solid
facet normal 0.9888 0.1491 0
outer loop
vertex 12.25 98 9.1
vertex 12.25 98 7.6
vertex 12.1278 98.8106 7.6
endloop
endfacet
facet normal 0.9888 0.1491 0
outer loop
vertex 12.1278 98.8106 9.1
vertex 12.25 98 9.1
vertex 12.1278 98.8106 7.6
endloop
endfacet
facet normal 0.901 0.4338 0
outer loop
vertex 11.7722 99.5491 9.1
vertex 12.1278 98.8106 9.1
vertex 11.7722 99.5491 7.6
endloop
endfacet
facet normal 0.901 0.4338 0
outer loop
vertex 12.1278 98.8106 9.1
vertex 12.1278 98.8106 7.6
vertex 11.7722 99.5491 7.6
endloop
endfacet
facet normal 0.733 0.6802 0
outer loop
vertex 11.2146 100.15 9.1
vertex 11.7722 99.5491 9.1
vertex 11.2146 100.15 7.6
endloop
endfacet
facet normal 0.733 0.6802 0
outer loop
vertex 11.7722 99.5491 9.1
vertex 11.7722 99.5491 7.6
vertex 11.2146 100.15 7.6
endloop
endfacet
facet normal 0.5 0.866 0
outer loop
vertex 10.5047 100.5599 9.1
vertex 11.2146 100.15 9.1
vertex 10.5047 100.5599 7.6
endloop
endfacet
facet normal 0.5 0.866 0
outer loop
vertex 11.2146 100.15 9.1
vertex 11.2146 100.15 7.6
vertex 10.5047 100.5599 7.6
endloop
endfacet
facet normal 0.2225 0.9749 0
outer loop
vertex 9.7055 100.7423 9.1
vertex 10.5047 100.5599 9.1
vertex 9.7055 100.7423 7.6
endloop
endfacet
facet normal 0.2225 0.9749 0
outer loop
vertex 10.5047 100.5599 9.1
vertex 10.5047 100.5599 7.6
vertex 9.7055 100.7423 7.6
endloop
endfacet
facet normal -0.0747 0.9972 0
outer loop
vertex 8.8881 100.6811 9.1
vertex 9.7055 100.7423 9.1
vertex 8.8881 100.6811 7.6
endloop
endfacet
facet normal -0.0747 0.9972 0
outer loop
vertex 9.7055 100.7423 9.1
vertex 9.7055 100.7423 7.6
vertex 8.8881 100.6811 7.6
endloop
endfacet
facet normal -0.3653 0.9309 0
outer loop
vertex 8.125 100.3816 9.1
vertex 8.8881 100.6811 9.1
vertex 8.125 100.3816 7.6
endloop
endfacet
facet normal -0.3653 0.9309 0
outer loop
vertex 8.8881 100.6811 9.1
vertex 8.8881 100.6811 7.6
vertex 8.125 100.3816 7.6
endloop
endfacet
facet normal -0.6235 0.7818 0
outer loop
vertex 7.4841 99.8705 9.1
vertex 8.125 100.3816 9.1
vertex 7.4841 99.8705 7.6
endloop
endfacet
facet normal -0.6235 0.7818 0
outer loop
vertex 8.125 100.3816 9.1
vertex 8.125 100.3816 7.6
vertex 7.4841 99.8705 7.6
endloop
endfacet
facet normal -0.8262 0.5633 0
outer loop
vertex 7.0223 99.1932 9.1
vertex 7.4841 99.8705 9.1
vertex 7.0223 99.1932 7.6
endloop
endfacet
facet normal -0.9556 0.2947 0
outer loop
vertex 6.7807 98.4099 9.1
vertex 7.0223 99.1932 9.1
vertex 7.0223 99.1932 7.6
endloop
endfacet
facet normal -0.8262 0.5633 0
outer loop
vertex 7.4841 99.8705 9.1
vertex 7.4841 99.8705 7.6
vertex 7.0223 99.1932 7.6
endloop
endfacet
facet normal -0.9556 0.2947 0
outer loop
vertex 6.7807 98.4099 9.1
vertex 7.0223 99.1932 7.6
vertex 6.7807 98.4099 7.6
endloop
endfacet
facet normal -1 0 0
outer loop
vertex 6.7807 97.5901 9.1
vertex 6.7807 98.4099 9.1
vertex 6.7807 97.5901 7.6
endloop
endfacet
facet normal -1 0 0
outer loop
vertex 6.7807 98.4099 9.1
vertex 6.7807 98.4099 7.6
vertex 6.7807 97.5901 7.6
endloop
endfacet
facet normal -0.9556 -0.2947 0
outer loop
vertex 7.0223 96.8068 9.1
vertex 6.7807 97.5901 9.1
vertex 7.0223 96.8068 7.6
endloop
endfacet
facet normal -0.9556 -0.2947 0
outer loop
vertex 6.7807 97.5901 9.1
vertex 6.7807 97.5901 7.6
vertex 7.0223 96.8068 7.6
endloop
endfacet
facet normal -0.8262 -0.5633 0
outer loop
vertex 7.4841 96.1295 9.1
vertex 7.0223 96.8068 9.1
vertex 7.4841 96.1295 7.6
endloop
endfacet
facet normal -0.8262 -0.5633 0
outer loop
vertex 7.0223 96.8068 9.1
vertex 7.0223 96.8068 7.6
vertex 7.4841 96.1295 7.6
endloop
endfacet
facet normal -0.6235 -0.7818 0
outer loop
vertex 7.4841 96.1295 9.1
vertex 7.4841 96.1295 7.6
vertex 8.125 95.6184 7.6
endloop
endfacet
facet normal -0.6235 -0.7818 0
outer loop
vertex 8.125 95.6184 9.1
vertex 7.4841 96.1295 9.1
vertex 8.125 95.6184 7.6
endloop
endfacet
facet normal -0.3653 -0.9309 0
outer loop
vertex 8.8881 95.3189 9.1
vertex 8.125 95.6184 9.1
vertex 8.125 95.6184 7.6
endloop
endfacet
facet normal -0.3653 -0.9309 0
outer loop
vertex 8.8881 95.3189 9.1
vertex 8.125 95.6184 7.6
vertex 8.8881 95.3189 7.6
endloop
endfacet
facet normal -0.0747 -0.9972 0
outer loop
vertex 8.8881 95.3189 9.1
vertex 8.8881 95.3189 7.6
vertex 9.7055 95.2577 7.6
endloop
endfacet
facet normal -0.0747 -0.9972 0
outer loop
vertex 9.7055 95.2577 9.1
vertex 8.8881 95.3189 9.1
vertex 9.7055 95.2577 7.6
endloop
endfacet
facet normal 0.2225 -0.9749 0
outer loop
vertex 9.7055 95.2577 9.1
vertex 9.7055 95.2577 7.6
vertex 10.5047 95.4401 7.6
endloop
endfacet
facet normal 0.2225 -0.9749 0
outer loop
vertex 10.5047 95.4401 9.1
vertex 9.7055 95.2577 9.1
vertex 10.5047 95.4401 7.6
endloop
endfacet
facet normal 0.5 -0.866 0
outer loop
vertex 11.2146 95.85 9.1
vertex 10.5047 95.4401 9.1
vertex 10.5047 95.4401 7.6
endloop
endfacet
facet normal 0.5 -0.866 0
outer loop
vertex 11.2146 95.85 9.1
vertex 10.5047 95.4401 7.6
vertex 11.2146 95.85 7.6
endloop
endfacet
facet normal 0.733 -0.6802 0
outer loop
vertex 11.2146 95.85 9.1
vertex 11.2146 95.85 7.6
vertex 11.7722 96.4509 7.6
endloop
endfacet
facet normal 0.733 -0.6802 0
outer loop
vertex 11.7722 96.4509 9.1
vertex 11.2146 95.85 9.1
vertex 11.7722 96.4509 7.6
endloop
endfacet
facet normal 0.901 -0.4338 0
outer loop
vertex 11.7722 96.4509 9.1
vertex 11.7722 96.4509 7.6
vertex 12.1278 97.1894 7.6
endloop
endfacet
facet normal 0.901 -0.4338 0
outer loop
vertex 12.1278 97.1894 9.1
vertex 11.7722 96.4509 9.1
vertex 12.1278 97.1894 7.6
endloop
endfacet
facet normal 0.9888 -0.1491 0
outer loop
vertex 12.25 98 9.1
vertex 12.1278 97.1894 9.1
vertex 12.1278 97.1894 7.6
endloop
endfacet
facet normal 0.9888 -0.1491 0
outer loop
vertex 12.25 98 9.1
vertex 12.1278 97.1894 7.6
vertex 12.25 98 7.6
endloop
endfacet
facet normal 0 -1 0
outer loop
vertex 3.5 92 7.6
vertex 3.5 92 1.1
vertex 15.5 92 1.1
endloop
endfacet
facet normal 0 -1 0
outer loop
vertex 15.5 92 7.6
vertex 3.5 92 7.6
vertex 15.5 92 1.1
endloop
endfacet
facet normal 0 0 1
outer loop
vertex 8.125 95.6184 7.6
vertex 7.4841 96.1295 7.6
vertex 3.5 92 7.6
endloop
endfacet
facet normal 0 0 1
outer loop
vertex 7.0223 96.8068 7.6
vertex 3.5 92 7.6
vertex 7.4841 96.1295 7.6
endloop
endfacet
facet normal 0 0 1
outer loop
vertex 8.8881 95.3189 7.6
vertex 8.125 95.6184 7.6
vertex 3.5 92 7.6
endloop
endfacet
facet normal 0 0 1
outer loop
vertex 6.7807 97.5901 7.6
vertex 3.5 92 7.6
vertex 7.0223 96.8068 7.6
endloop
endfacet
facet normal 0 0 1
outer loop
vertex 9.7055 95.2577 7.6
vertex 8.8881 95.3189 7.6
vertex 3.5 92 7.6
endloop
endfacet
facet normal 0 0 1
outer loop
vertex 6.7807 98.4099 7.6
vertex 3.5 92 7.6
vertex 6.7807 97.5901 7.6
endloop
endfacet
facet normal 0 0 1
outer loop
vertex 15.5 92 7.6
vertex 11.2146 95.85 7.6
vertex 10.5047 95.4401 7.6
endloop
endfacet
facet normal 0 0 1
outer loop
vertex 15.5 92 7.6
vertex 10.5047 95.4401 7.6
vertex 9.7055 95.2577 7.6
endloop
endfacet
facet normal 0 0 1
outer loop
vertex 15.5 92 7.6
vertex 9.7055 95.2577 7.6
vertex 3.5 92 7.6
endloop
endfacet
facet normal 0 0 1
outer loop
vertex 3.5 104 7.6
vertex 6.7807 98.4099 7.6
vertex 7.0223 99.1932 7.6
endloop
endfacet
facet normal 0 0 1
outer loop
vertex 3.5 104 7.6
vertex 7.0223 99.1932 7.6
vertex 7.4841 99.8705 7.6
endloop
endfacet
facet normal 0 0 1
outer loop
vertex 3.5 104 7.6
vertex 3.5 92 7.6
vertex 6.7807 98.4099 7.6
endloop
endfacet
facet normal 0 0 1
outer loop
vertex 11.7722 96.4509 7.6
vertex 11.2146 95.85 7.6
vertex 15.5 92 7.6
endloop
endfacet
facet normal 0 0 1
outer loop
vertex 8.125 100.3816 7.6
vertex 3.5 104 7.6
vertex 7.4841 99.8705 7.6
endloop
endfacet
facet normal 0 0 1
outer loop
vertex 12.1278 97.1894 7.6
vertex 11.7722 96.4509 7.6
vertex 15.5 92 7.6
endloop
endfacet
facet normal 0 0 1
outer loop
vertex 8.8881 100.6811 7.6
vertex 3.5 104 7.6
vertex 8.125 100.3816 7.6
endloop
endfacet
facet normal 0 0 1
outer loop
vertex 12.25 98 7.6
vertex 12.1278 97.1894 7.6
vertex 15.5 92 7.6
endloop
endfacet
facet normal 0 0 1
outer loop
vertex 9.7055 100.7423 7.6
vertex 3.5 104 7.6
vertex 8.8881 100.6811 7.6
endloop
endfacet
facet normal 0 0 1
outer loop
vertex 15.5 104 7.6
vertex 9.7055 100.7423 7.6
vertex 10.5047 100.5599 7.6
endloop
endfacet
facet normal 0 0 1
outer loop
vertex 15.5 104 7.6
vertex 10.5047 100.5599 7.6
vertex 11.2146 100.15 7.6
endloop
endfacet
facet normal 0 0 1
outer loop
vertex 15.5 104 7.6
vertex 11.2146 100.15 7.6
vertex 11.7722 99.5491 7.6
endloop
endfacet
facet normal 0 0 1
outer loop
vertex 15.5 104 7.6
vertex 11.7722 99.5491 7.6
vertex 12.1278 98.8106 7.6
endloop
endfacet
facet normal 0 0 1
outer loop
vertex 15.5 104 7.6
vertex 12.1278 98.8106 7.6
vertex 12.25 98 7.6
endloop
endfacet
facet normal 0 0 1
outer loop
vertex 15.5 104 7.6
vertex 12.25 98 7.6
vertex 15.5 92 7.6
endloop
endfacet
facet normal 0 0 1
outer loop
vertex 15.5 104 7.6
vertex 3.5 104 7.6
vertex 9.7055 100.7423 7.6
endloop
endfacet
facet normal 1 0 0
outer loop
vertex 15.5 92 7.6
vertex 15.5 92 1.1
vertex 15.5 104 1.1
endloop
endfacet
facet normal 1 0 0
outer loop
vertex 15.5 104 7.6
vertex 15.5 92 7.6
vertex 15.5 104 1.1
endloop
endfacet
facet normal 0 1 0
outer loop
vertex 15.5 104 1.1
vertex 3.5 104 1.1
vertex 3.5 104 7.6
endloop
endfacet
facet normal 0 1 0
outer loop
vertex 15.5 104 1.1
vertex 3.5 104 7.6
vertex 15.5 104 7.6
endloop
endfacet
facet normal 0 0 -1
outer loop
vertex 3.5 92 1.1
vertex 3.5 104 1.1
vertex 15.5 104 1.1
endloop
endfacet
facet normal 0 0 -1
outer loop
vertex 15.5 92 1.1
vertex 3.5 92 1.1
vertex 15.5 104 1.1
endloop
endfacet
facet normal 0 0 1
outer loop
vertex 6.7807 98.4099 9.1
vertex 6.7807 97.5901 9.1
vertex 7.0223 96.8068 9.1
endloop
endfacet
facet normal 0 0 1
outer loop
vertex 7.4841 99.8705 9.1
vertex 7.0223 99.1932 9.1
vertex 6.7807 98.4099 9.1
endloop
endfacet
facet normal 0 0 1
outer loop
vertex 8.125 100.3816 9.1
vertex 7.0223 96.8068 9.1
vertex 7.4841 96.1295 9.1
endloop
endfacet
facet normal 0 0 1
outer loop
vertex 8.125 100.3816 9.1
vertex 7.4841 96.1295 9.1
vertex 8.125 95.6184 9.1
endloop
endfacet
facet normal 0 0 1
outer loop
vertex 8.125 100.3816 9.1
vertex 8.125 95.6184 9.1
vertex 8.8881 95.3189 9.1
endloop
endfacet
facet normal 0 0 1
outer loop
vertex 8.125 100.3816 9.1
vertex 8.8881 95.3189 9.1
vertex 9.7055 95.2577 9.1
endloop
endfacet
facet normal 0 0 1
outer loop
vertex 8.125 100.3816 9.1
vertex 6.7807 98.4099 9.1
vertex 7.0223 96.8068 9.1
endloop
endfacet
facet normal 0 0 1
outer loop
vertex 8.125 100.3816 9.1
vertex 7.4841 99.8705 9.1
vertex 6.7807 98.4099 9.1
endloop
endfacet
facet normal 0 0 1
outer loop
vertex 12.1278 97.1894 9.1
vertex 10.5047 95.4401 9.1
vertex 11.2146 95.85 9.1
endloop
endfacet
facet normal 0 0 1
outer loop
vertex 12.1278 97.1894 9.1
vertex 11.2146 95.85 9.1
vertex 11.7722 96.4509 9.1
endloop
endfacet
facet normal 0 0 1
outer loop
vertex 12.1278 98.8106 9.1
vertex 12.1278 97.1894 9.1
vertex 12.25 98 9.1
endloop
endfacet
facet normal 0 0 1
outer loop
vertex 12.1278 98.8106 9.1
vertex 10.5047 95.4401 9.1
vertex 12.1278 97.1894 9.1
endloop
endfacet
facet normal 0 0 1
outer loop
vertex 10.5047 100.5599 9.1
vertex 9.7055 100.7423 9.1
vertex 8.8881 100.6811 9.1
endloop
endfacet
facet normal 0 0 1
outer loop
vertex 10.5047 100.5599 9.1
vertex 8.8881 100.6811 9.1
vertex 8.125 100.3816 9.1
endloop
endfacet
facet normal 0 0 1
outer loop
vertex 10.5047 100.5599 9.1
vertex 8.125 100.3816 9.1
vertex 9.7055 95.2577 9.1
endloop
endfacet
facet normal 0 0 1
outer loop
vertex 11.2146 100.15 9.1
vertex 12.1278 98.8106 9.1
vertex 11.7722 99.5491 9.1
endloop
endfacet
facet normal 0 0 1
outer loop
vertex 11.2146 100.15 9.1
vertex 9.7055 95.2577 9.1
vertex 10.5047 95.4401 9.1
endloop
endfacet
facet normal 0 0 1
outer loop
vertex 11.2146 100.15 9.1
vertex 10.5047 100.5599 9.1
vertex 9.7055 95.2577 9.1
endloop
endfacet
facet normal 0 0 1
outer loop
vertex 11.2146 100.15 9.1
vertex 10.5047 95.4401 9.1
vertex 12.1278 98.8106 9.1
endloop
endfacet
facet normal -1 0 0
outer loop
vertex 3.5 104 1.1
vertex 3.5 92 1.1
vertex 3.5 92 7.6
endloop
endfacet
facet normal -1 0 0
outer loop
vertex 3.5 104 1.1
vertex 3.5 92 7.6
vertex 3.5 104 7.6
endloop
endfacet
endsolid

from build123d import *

# Parameters (mm, degrees)
BOX010_W          = 12
BOX010_H          = 12
BOX010_DEPTH      = 6.5
CYLINDER004_R     = 2.75
CYLINDER004_DEPTH = 2.5


with BuildPart() as butbase001:
    # Box010 → Box010 (new body)
    with BuildSketch(Plane.XY):
        with Locations((6, 6)):
            Rectangle(BOX010_W, BOX010_H)
    extrude(amount=BOX010_DEPTH)


with BuildPart() as button_onoff:
    # Cylinder004 → Cylinder004 (new body)
    with BuildSketch(Plane(origin=(6, 6, 5.5), x_dir=(1, 0, 0), z_dir=(0, 0, 1))):
        Circle(CYLINDER004_R)
    extrude(amount=CYLINDER004_DEPTH)

    # Fusion002: union butbase001
    add(butbase001.part)


with BuildPart() as button_onoff_1:
    # Fusion002 placement: moved
    add(button_onoff.part.moved(Location((3.5, 92, 1.1))))


solid = button_onoff_1.part
